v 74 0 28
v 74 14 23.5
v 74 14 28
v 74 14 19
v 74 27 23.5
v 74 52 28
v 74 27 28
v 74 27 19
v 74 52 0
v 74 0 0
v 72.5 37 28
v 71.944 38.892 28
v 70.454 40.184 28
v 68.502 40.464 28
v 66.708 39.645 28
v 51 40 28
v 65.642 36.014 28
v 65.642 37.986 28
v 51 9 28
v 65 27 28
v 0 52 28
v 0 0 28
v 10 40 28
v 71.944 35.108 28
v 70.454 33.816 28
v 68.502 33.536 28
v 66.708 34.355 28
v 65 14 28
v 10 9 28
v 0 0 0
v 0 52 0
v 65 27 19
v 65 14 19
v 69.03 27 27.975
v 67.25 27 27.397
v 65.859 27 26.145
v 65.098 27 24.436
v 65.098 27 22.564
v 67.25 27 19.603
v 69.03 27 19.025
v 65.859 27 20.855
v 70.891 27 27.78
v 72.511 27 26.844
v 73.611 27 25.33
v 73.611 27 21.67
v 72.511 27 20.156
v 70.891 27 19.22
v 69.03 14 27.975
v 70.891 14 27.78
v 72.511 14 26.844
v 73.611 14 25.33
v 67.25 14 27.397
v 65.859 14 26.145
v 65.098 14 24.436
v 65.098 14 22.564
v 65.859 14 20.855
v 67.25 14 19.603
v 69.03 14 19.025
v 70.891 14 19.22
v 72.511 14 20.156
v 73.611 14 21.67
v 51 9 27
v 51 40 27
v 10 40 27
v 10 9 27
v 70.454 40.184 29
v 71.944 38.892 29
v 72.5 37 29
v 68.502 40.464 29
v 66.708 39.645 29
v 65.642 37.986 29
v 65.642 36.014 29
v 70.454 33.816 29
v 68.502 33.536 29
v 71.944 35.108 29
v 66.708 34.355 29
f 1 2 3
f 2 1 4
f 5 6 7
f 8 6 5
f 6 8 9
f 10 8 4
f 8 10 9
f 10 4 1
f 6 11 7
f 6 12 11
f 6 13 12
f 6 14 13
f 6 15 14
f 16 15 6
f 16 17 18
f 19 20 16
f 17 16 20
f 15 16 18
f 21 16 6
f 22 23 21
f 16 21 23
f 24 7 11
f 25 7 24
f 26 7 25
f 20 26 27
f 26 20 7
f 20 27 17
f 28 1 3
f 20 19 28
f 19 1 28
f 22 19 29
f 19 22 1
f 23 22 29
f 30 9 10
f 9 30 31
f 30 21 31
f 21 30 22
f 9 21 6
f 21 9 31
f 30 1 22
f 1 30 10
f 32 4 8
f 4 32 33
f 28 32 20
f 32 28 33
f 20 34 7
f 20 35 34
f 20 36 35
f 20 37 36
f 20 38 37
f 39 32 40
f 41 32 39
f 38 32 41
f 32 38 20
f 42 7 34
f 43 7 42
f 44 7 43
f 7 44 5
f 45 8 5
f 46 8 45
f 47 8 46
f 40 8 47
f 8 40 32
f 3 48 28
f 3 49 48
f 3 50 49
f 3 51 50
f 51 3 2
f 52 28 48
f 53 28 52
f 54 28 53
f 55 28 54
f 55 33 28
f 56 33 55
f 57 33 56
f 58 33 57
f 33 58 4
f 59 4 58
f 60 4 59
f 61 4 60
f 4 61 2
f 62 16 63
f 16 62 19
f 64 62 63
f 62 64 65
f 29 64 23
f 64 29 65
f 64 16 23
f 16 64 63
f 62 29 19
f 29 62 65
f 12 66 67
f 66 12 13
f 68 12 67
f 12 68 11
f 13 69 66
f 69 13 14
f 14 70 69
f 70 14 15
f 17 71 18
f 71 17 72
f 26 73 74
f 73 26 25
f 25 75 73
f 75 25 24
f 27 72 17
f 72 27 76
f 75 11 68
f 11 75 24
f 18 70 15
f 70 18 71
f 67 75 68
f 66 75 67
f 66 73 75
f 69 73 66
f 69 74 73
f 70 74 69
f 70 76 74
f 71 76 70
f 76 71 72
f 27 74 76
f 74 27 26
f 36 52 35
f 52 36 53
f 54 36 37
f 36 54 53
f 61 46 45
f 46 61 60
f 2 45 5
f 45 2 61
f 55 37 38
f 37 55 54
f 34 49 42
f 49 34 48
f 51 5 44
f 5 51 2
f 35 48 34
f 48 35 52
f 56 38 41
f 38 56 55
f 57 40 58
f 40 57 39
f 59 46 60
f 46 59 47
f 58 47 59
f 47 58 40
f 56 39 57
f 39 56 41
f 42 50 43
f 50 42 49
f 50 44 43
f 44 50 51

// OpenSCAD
module toolkitrc_m7() {
  difference() {
    cube([74, 52, 28]);
    translate([74 - 9, 52 - (25 + 13), 28 - 9]) {
      cube([10, 13, 10]);
    }
    translate([10, 9, 28 - 1]) {
      cube([41, 31, 5]);
    }
  }
  translate([69, 37, 28]) {
    cylinder(r = 3.5, h = 1);
  }
  translate([74 - 9, 52 - (25 + 13), 28 - 9]) {
    translate([4.5, 0, 4.5]) {
      rotate(90, [-1, 0, 0]) {
        cylinder(h = 13, r = 4.5);
      }
    }
  }
}

toolkitrc_m7();
